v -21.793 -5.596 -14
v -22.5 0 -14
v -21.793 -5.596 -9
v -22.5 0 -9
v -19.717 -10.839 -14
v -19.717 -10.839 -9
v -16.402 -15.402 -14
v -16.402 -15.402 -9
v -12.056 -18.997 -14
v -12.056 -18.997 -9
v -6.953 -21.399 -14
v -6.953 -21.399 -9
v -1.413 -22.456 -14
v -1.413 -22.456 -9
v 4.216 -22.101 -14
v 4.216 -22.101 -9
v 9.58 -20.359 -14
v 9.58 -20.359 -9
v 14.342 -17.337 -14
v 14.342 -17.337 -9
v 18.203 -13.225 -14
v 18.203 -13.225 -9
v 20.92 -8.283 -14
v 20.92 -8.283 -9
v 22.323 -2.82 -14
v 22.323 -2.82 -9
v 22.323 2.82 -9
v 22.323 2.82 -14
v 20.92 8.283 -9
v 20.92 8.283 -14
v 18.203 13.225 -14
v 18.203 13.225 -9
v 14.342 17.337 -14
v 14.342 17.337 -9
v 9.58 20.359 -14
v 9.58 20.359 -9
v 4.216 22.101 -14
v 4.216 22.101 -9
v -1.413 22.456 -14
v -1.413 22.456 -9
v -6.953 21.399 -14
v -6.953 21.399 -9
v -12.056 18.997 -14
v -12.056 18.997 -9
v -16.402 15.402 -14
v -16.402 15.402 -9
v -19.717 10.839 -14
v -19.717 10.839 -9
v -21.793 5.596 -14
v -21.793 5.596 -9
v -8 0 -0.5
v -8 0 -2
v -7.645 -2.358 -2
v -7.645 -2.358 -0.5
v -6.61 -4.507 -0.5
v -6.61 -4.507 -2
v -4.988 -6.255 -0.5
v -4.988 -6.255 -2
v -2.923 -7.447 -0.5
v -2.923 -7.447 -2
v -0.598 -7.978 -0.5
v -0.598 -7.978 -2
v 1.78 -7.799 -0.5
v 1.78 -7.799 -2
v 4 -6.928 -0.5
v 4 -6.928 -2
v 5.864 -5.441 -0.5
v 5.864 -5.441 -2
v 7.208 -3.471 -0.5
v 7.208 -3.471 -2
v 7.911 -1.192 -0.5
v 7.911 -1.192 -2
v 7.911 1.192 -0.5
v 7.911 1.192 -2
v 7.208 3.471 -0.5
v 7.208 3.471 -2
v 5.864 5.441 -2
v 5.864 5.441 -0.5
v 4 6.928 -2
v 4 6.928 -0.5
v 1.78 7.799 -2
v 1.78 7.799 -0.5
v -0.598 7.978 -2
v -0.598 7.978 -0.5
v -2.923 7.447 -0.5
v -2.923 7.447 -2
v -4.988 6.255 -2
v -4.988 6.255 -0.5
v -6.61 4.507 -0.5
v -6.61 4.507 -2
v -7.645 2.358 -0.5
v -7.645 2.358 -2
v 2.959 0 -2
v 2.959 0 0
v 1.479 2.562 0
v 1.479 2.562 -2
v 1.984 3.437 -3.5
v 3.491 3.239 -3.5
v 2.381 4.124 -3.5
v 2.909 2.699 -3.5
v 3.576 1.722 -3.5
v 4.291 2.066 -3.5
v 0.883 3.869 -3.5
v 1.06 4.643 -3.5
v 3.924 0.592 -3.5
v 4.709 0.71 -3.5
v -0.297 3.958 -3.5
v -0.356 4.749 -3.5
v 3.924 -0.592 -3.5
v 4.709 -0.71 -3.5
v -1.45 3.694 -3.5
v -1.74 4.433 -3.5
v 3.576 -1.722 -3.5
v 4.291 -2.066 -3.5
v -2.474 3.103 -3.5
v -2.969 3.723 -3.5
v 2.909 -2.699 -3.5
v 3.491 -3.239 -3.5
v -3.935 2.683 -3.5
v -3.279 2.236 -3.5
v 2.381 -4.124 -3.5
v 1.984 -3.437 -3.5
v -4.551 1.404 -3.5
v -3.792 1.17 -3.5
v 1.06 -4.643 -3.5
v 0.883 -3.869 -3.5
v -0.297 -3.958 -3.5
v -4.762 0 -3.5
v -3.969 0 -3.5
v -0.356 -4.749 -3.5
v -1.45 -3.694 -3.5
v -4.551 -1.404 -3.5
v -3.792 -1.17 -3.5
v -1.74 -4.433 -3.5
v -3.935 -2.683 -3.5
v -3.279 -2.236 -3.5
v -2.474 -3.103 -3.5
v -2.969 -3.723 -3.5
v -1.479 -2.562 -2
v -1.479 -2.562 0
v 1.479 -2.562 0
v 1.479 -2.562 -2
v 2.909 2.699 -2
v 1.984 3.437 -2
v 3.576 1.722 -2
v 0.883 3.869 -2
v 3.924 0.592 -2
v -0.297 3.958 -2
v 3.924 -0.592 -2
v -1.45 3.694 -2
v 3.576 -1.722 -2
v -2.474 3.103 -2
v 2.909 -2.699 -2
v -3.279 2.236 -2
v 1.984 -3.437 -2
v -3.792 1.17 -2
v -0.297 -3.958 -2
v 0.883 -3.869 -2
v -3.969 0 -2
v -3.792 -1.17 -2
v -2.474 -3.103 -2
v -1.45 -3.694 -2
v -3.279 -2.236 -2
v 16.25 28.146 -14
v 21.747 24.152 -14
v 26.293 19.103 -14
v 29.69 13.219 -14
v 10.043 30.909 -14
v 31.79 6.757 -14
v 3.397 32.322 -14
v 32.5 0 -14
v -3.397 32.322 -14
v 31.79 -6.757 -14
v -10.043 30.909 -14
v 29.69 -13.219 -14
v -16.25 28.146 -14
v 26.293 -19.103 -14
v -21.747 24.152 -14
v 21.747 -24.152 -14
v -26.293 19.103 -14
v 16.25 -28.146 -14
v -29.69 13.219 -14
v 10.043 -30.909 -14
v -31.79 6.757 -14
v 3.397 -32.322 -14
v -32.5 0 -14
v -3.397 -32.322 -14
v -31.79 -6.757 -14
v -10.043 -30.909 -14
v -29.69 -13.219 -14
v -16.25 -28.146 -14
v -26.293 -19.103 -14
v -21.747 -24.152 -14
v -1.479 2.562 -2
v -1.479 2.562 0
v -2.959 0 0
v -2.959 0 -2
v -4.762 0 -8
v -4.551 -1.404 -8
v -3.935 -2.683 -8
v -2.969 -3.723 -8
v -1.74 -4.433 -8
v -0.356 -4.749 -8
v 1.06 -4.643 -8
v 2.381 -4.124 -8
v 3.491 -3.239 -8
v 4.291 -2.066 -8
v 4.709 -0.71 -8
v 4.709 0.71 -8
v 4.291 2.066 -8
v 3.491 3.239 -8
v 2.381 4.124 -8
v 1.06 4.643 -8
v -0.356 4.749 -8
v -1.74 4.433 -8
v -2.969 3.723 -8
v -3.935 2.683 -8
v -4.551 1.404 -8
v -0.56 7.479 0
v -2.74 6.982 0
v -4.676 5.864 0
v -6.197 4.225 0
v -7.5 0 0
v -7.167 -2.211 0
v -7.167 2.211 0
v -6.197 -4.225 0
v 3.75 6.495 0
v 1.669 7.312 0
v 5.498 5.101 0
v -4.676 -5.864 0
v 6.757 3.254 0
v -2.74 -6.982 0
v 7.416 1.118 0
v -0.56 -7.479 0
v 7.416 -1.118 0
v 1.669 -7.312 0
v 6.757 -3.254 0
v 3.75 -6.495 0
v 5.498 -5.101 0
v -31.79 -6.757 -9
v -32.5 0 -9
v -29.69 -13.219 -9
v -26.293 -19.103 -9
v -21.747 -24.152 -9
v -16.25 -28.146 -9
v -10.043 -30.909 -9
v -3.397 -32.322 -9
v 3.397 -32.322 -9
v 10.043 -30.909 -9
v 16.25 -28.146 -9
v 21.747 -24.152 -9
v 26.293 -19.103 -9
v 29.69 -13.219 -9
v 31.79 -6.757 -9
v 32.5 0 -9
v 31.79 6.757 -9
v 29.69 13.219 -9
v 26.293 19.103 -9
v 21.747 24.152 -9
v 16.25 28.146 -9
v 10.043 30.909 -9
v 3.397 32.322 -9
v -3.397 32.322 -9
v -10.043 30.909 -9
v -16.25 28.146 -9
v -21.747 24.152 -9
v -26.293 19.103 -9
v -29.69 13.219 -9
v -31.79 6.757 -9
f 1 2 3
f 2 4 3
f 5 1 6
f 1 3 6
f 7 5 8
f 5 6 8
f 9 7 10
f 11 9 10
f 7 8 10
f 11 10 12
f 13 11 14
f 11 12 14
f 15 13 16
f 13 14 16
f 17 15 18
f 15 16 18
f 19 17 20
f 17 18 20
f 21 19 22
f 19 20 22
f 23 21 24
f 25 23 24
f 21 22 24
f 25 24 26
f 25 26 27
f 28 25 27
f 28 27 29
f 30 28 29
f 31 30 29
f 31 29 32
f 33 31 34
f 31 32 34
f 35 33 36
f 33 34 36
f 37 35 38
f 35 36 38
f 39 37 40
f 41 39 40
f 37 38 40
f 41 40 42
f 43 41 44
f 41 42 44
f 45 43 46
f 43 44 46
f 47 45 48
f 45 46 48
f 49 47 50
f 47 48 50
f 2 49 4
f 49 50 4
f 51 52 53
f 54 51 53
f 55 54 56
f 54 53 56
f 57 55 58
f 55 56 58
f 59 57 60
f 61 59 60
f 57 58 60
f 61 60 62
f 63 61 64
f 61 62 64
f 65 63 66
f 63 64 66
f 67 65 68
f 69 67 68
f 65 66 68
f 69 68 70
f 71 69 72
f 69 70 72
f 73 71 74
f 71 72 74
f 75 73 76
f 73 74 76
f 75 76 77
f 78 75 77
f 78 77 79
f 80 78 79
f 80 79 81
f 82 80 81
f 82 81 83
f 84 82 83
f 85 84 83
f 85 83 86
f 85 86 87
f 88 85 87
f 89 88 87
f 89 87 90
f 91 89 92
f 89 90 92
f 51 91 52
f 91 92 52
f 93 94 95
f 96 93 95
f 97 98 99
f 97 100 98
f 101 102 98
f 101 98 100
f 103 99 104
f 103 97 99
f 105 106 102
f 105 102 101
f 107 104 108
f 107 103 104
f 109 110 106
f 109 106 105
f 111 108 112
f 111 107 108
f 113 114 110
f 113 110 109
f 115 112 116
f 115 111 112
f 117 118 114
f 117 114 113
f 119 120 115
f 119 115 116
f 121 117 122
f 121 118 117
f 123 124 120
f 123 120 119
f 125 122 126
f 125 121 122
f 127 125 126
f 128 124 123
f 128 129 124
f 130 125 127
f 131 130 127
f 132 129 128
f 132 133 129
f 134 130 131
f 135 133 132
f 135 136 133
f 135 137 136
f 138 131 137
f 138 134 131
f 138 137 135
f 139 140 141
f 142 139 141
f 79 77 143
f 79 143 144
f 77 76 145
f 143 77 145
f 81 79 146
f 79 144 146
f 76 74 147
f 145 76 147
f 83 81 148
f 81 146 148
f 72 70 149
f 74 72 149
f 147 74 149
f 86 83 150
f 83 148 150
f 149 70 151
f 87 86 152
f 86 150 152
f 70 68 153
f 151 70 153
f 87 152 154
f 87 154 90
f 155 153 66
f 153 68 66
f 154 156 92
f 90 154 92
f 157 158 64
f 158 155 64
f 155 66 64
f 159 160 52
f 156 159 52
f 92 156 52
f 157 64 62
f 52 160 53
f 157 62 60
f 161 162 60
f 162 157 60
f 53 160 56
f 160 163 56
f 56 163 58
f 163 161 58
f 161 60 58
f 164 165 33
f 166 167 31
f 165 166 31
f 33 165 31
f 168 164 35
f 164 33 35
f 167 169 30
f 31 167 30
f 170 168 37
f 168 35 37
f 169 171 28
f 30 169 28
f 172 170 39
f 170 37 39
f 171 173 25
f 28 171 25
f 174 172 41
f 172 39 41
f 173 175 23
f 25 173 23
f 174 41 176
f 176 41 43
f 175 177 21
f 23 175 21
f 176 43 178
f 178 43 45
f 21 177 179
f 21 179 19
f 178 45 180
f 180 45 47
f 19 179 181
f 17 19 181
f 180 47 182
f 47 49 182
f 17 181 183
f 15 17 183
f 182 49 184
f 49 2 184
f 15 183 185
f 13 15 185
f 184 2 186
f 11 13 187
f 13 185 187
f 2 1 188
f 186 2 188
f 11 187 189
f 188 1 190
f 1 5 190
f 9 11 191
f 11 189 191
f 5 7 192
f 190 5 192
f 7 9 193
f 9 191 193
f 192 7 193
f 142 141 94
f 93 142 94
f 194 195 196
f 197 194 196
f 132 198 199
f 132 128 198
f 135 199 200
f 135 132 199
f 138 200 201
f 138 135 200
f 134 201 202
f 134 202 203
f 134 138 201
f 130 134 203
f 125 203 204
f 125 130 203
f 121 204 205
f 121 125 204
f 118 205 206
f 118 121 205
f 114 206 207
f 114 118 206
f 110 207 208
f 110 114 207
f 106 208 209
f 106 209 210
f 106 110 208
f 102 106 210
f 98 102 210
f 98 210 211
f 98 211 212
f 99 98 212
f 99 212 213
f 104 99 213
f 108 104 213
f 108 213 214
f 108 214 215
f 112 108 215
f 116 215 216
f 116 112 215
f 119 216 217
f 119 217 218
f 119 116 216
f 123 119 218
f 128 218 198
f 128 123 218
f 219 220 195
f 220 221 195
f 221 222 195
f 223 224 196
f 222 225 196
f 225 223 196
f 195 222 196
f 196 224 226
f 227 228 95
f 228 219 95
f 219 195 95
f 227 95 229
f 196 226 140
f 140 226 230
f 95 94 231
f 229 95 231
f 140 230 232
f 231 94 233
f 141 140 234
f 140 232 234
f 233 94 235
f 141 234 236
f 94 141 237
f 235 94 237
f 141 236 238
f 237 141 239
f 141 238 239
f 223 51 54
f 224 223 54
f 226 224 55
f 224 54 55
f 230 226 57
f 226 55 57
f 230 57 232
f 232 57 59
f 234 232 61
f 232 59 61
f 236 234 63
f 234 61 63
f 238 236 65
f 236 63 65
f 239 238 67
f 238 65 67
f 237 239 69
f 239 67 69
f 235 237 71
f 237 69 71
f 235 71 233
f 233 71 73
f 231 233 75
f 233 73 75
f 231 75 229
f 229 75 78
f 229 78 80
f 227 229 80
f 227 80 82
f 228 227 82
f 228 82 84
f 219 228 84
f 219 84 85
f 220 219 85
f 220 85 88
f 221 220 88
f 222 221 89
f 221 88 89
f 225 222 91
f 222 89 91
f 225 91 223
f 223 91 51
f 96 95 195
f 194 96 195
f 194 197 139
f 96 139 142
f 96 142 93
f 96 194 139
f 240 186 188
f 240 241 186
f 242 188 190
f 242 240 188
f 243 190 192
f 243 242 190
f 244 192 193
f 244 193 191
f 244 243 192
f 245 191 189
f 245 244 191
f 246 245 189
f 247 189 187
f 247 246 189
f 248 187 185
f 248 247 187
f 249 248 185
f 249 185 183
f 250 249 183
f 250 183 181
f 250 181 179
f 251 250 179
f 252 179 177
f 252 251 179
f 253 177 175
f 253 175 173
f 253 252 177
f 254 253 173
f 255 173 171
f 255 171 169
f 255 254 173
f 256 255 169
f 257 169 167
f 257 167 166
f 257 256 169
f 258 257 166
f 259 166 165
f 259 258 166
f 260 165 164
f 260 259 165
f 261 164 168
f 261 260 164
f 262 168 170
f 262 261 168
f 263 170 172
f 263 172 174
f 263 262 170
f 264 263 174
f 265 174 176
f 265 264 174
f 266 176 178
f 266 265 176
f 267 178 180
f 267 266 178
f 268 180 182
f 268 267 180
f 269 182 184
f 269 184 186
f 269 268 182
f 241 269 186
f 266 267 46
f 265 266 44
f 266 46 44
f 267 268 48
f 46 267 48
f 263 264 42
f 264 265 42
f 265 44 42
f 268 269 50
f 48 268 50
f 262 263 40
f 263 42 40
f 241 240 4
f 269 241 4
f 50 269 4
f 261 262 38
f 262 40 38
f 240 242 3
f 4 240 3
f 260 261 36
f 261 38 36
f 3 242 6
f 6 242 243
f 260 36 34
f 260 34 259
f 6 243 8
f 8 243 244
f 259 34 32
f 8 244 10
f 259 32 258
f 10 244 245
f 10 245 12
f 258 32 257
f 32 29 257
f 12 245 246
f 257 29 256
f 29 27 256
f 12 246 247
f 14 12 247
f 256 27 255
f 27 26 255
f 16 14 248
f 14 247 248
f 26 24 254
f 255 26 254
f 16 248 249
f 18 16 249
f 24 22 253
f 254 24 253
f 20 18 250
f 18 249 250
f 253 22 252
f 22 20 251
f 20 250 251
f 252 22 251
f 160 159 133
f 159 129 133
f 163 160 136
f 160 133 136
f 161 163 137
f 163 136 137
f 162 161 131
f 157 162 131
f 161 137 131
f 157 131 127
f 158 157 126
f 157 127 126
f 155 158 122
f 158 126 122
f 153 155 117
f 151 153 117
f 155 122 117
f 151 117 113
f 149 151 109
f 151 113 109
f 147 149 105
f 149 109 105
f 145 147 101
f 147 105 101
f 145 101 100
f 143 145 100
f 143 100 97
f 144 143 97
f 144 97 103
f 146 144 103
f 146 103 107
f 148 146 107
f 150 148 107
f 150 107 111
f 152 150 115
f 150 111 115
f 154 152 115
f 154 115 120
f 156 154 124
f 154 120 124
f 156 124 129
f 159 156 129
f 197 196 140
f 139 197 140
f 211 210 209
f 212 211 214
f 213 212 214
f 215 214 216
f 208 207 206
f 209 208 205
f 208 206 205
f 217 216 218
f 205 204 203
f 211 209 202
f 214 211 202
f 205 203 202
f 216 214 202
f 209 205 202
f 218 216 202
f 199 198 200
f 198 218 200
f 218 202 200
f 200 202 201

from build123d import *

# Parameters (mm, degrees)
F0_W     = 0.79375
F0_H     = 4.5
F3_DEPTH = 2
F4_SIZE  = 0.5
F0_W_2   = 7.754
F0_H_2   = 5
F0_W_3   = 2.246


# Not quite as in the source:
# - a feature of the source that left no trace in its solid (it failed there, or was rolled back) is left out


with BuildPart() as f1:
    # F0 (on Front) → F1 (revolve)
    with BuildSketch(Plane.XZ):
        Polygon((-3.96875, -3.5), (-3.96875, -8), (0, -8), (0, 0), (-8, 0), (-8, -2), (-6, -2), (-3.96875, -2), (-3.96875, -2.5), align=None)
        with Locations((-4.365625, -5.75)):
            Rectangle(F0_W, F0_H)
    revolve(axis=Axis((0, 0, -5.6257829033), (0, 0, 1)))

    # F2 (on face) → F3 (cut)
    with BuildSketch(Plane.XY):
        Polygon((1.4794600648, 2.5625), (-1.4794600648, 2.5625), (-2.9589201296, 0), (-1.4794600648, -2.5625), (1.4794600648, -2.5625), (2.9589201296, 0), align=None)
    extrude(amount=-F3_DEPTH, mode=Mode.SUBTRACT)

    # F4
    f4_edges = [f1.edges().sort_by_distance(p)[0] for p in [
        (8, 0, 0),
    ]]
    chamfer(f4_edges, length=F4_SIZE)


with BuildPart() as f6:
    # F0 (on Front) → F6 (revolve)
    with BuildSketch(Plane.XZ):
        with Locations((-26.377, -11.5)):
            Rectangle(F0_W_2, F0_H_2)
        with Locations((-31.377, -11.5)):
            Rectangle(F0_W_3, F0_H_2)
    revolve(axis=Axis((0, 0, -5.6257829033), (0, 0, 1)))


solid = Compound([f1.part, f6.part])
